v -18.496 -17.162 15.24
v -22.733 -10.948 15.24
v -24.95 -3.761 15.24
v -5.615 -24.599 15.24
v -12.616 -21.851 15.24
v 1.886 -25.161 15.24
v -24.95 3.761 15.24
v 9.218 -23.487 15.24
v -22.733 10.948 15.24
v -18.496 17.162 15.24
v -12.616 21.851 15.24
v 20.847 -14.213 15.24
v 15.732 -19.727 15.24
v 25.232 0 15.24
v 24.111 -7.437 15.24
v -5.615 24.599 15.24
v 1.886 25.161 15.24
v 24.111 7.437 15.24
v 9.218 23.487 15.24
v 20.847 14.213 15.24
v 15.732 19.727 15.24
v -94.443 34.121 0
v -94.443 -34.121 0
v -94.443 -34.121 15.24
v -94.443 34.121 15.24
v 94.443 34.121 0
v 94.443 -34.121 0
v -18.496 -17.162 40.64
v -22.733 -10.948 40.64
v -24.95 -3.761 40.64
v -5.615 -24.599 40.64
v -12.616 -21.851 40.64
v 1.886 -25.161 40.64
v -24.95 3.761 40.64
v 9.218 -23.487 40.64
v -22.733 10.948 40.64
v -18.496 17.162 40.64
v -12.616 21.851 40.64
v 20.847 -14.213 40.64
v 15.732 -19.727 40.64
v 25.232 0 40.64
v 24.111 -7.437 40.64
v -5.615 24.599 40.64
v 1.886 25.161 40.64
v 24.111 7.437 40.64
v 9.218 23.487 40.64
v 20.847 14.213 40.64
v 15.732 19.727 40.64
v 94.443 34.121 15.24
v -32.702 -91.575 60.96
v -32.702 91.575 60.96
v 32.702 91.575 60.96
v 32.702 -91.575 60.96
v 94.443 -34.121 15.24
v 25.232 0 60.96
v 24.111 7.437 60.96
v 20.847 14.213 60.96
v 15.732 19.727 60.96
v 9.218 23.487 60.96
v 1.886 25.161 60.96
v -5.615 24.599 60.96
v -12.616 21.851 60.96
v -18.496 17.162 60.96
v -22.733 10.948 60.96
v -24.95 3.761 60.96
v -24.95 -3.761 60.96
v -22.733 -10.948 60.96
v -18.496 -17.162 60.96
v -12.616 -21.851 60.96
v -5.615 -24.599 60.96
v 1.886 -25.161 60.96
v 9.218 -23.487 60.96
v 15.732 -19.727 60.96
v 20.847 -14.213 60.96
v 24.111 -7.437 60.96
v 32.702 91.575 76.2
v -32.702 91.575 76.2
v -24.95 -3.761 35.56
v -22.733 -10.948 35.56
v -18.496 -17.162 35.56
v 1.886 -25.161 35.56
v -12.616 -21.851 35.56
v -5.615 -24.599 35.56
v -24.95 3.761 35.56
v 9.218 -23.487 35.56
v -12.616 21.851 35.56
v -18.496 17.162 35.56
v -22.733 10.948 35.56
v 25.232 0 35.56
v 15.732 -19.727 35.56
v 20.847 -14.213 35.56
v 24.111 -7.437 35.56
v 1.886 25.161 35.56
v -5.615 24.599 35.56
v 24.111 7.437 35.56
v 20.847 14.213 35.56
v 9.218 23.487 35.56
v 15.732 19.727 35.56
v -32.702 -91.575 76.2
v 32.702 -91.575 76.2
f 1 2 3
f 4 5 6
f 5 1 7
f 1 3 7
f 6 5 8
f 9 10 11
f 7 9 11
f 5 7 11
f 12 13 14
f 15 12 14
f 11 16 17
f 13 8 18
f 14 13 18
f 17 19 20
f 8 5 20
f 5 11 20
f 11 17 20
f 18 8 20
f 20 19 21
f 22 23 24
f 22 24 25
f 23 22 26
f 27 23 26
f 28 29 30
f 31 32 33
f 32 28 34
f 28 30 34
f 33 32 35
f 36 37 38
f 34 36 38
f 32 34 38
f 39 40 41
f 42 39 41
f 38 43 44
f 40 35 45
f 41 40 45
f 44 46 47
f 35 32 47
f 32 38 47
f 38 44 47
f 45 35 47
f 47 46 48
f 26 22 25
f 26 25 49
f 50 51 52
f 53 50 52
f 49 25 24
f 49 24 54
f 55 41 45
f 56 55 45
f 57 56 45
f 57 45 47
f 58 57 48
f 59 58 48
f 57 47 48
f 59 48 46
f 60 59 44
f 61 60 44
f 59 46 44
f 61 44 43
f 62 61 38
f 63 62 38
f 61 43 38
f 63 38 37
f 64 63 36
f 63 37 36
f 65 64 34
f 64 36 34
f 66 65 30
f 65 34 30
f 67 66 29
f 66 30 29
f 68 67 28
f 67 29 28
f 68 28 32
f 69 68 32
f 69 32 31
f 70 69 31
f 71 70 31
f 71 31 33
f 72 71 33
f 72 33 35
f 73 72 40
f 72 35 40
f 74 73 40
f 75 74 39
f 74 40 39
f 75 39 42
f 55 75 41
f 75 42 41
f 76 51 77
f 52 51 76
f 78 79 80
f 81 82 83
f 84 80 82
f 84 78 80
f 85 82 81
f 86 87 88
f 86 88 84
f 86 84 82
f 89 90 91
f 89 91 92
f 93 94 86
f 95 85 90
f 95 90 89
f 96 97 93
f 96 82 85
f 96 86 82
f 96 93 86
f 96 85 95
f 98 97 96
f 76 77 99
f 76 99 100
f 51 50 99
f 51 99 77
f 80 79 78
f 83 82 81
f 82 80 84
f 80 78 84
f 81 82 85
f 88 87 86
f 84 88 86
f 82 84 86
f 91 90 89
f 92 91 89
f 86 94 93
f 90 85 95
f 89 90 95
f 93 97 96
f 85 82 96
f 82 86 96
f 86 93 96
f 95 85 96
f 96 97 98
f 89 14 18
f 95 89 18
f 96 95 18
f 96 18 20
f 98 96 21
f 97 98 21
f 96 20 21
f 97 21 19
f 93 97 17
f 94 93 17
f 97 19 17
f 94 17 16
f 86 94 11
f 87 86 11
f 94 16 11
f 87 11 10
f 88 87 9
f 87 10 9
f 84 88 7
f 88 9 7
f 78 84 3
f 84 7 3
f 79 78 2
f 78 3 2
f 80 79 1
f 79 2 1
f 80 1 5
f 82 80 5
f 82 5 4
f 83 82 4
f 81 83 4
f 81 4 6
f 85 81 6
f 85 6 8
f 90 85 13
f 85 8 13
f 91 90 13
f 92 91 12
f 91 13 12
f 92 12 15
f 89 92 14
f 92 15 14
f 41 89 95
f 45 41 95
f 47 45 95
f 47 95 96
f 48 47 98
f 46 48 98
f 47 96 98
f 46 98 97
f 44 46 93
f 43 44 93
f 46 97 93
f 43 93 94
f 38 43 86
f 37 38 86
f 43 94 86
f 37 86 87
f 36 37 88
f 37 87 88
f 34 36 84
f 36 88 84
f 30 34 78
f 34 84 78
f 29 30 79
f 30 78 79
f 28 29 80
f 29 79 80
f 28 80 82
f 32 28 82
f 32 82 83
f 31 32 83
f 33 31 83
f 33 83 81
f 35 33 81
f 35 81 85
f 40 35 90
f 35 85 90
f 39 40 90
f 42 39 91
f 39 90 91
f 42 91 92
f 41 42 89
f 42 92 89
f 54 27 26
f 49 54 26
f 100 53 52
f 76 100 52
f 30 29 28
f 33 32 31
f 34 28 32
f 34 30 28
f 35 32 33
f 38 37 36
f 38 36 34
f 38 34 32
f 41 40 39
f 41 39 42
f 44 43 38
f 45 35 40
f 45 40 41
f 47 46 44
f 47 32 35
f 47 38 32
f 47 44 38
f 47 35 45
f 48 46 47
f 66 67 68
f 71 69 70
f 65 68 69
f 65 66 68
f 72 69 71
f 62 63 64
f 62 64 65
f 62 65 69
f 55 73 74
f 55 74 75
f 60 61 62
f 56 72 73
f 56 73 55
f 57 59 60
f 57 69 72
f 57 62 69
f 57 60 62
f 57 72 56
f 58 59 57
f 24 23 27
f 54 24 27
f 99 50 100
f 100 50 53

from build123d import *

# Parameters (mm, degrees)
F0_W     = 188.8861060143
F0_H     = 68.2425498962
F1_DEPTH = 15.24
F2_R     = 25.231639978
F3_DEPTH = 20.32
F4_DEPTH = 5.08
F5_DEPTH = 20.32
F6_W     = 65.4039755464
F6_H     = 183.1498295069
F7_DEPTH = 15.24


with BuildPart() as f1:
    # F0 (on Top) → F1 (new body)
    with BuildSketch(Plane.XY):
        Rectangle(F0_W, F0_H)
    extrude(amount=F1_DEPTH)


with BuildPart() as f3:
    # F2 (on face) → F3 (new body)
    with BuildSketch(Plane.XY.offset(15.24)):
        Circle(F2_R)
    extrude(amount=F3_DEPTH)


with BuildPart() as f4:
    # F4 (new): a face of the model
    f4_faces = [f3.part.faces().sort_by_distance(p)[0] for p in [
        (0, 0, 35.56),
    ]]
    extrude(f4_faces, amount=F4_DEPTH)


with BuildPart() as f5:
    # F5 (new): a face of the model
    f5_faces = [f4.part.faces().sort_by_distance(p)[0] for p in [
        (0, 0, 40.64),
    ]]
    extrude(f5_faces, amount=F5_DEPTH)


with BuildPart() as f7:
    # F6 (on face) → F7 (new body)
    with BuildSketch(Plane.XY.offset(60.96)):
        Rectangle(F6_W, F6_H)
    extrude(amount=F7_DEPTH)


solid = Compound([f1.part, f3.part, f4.part, f5.part, f7.part])
